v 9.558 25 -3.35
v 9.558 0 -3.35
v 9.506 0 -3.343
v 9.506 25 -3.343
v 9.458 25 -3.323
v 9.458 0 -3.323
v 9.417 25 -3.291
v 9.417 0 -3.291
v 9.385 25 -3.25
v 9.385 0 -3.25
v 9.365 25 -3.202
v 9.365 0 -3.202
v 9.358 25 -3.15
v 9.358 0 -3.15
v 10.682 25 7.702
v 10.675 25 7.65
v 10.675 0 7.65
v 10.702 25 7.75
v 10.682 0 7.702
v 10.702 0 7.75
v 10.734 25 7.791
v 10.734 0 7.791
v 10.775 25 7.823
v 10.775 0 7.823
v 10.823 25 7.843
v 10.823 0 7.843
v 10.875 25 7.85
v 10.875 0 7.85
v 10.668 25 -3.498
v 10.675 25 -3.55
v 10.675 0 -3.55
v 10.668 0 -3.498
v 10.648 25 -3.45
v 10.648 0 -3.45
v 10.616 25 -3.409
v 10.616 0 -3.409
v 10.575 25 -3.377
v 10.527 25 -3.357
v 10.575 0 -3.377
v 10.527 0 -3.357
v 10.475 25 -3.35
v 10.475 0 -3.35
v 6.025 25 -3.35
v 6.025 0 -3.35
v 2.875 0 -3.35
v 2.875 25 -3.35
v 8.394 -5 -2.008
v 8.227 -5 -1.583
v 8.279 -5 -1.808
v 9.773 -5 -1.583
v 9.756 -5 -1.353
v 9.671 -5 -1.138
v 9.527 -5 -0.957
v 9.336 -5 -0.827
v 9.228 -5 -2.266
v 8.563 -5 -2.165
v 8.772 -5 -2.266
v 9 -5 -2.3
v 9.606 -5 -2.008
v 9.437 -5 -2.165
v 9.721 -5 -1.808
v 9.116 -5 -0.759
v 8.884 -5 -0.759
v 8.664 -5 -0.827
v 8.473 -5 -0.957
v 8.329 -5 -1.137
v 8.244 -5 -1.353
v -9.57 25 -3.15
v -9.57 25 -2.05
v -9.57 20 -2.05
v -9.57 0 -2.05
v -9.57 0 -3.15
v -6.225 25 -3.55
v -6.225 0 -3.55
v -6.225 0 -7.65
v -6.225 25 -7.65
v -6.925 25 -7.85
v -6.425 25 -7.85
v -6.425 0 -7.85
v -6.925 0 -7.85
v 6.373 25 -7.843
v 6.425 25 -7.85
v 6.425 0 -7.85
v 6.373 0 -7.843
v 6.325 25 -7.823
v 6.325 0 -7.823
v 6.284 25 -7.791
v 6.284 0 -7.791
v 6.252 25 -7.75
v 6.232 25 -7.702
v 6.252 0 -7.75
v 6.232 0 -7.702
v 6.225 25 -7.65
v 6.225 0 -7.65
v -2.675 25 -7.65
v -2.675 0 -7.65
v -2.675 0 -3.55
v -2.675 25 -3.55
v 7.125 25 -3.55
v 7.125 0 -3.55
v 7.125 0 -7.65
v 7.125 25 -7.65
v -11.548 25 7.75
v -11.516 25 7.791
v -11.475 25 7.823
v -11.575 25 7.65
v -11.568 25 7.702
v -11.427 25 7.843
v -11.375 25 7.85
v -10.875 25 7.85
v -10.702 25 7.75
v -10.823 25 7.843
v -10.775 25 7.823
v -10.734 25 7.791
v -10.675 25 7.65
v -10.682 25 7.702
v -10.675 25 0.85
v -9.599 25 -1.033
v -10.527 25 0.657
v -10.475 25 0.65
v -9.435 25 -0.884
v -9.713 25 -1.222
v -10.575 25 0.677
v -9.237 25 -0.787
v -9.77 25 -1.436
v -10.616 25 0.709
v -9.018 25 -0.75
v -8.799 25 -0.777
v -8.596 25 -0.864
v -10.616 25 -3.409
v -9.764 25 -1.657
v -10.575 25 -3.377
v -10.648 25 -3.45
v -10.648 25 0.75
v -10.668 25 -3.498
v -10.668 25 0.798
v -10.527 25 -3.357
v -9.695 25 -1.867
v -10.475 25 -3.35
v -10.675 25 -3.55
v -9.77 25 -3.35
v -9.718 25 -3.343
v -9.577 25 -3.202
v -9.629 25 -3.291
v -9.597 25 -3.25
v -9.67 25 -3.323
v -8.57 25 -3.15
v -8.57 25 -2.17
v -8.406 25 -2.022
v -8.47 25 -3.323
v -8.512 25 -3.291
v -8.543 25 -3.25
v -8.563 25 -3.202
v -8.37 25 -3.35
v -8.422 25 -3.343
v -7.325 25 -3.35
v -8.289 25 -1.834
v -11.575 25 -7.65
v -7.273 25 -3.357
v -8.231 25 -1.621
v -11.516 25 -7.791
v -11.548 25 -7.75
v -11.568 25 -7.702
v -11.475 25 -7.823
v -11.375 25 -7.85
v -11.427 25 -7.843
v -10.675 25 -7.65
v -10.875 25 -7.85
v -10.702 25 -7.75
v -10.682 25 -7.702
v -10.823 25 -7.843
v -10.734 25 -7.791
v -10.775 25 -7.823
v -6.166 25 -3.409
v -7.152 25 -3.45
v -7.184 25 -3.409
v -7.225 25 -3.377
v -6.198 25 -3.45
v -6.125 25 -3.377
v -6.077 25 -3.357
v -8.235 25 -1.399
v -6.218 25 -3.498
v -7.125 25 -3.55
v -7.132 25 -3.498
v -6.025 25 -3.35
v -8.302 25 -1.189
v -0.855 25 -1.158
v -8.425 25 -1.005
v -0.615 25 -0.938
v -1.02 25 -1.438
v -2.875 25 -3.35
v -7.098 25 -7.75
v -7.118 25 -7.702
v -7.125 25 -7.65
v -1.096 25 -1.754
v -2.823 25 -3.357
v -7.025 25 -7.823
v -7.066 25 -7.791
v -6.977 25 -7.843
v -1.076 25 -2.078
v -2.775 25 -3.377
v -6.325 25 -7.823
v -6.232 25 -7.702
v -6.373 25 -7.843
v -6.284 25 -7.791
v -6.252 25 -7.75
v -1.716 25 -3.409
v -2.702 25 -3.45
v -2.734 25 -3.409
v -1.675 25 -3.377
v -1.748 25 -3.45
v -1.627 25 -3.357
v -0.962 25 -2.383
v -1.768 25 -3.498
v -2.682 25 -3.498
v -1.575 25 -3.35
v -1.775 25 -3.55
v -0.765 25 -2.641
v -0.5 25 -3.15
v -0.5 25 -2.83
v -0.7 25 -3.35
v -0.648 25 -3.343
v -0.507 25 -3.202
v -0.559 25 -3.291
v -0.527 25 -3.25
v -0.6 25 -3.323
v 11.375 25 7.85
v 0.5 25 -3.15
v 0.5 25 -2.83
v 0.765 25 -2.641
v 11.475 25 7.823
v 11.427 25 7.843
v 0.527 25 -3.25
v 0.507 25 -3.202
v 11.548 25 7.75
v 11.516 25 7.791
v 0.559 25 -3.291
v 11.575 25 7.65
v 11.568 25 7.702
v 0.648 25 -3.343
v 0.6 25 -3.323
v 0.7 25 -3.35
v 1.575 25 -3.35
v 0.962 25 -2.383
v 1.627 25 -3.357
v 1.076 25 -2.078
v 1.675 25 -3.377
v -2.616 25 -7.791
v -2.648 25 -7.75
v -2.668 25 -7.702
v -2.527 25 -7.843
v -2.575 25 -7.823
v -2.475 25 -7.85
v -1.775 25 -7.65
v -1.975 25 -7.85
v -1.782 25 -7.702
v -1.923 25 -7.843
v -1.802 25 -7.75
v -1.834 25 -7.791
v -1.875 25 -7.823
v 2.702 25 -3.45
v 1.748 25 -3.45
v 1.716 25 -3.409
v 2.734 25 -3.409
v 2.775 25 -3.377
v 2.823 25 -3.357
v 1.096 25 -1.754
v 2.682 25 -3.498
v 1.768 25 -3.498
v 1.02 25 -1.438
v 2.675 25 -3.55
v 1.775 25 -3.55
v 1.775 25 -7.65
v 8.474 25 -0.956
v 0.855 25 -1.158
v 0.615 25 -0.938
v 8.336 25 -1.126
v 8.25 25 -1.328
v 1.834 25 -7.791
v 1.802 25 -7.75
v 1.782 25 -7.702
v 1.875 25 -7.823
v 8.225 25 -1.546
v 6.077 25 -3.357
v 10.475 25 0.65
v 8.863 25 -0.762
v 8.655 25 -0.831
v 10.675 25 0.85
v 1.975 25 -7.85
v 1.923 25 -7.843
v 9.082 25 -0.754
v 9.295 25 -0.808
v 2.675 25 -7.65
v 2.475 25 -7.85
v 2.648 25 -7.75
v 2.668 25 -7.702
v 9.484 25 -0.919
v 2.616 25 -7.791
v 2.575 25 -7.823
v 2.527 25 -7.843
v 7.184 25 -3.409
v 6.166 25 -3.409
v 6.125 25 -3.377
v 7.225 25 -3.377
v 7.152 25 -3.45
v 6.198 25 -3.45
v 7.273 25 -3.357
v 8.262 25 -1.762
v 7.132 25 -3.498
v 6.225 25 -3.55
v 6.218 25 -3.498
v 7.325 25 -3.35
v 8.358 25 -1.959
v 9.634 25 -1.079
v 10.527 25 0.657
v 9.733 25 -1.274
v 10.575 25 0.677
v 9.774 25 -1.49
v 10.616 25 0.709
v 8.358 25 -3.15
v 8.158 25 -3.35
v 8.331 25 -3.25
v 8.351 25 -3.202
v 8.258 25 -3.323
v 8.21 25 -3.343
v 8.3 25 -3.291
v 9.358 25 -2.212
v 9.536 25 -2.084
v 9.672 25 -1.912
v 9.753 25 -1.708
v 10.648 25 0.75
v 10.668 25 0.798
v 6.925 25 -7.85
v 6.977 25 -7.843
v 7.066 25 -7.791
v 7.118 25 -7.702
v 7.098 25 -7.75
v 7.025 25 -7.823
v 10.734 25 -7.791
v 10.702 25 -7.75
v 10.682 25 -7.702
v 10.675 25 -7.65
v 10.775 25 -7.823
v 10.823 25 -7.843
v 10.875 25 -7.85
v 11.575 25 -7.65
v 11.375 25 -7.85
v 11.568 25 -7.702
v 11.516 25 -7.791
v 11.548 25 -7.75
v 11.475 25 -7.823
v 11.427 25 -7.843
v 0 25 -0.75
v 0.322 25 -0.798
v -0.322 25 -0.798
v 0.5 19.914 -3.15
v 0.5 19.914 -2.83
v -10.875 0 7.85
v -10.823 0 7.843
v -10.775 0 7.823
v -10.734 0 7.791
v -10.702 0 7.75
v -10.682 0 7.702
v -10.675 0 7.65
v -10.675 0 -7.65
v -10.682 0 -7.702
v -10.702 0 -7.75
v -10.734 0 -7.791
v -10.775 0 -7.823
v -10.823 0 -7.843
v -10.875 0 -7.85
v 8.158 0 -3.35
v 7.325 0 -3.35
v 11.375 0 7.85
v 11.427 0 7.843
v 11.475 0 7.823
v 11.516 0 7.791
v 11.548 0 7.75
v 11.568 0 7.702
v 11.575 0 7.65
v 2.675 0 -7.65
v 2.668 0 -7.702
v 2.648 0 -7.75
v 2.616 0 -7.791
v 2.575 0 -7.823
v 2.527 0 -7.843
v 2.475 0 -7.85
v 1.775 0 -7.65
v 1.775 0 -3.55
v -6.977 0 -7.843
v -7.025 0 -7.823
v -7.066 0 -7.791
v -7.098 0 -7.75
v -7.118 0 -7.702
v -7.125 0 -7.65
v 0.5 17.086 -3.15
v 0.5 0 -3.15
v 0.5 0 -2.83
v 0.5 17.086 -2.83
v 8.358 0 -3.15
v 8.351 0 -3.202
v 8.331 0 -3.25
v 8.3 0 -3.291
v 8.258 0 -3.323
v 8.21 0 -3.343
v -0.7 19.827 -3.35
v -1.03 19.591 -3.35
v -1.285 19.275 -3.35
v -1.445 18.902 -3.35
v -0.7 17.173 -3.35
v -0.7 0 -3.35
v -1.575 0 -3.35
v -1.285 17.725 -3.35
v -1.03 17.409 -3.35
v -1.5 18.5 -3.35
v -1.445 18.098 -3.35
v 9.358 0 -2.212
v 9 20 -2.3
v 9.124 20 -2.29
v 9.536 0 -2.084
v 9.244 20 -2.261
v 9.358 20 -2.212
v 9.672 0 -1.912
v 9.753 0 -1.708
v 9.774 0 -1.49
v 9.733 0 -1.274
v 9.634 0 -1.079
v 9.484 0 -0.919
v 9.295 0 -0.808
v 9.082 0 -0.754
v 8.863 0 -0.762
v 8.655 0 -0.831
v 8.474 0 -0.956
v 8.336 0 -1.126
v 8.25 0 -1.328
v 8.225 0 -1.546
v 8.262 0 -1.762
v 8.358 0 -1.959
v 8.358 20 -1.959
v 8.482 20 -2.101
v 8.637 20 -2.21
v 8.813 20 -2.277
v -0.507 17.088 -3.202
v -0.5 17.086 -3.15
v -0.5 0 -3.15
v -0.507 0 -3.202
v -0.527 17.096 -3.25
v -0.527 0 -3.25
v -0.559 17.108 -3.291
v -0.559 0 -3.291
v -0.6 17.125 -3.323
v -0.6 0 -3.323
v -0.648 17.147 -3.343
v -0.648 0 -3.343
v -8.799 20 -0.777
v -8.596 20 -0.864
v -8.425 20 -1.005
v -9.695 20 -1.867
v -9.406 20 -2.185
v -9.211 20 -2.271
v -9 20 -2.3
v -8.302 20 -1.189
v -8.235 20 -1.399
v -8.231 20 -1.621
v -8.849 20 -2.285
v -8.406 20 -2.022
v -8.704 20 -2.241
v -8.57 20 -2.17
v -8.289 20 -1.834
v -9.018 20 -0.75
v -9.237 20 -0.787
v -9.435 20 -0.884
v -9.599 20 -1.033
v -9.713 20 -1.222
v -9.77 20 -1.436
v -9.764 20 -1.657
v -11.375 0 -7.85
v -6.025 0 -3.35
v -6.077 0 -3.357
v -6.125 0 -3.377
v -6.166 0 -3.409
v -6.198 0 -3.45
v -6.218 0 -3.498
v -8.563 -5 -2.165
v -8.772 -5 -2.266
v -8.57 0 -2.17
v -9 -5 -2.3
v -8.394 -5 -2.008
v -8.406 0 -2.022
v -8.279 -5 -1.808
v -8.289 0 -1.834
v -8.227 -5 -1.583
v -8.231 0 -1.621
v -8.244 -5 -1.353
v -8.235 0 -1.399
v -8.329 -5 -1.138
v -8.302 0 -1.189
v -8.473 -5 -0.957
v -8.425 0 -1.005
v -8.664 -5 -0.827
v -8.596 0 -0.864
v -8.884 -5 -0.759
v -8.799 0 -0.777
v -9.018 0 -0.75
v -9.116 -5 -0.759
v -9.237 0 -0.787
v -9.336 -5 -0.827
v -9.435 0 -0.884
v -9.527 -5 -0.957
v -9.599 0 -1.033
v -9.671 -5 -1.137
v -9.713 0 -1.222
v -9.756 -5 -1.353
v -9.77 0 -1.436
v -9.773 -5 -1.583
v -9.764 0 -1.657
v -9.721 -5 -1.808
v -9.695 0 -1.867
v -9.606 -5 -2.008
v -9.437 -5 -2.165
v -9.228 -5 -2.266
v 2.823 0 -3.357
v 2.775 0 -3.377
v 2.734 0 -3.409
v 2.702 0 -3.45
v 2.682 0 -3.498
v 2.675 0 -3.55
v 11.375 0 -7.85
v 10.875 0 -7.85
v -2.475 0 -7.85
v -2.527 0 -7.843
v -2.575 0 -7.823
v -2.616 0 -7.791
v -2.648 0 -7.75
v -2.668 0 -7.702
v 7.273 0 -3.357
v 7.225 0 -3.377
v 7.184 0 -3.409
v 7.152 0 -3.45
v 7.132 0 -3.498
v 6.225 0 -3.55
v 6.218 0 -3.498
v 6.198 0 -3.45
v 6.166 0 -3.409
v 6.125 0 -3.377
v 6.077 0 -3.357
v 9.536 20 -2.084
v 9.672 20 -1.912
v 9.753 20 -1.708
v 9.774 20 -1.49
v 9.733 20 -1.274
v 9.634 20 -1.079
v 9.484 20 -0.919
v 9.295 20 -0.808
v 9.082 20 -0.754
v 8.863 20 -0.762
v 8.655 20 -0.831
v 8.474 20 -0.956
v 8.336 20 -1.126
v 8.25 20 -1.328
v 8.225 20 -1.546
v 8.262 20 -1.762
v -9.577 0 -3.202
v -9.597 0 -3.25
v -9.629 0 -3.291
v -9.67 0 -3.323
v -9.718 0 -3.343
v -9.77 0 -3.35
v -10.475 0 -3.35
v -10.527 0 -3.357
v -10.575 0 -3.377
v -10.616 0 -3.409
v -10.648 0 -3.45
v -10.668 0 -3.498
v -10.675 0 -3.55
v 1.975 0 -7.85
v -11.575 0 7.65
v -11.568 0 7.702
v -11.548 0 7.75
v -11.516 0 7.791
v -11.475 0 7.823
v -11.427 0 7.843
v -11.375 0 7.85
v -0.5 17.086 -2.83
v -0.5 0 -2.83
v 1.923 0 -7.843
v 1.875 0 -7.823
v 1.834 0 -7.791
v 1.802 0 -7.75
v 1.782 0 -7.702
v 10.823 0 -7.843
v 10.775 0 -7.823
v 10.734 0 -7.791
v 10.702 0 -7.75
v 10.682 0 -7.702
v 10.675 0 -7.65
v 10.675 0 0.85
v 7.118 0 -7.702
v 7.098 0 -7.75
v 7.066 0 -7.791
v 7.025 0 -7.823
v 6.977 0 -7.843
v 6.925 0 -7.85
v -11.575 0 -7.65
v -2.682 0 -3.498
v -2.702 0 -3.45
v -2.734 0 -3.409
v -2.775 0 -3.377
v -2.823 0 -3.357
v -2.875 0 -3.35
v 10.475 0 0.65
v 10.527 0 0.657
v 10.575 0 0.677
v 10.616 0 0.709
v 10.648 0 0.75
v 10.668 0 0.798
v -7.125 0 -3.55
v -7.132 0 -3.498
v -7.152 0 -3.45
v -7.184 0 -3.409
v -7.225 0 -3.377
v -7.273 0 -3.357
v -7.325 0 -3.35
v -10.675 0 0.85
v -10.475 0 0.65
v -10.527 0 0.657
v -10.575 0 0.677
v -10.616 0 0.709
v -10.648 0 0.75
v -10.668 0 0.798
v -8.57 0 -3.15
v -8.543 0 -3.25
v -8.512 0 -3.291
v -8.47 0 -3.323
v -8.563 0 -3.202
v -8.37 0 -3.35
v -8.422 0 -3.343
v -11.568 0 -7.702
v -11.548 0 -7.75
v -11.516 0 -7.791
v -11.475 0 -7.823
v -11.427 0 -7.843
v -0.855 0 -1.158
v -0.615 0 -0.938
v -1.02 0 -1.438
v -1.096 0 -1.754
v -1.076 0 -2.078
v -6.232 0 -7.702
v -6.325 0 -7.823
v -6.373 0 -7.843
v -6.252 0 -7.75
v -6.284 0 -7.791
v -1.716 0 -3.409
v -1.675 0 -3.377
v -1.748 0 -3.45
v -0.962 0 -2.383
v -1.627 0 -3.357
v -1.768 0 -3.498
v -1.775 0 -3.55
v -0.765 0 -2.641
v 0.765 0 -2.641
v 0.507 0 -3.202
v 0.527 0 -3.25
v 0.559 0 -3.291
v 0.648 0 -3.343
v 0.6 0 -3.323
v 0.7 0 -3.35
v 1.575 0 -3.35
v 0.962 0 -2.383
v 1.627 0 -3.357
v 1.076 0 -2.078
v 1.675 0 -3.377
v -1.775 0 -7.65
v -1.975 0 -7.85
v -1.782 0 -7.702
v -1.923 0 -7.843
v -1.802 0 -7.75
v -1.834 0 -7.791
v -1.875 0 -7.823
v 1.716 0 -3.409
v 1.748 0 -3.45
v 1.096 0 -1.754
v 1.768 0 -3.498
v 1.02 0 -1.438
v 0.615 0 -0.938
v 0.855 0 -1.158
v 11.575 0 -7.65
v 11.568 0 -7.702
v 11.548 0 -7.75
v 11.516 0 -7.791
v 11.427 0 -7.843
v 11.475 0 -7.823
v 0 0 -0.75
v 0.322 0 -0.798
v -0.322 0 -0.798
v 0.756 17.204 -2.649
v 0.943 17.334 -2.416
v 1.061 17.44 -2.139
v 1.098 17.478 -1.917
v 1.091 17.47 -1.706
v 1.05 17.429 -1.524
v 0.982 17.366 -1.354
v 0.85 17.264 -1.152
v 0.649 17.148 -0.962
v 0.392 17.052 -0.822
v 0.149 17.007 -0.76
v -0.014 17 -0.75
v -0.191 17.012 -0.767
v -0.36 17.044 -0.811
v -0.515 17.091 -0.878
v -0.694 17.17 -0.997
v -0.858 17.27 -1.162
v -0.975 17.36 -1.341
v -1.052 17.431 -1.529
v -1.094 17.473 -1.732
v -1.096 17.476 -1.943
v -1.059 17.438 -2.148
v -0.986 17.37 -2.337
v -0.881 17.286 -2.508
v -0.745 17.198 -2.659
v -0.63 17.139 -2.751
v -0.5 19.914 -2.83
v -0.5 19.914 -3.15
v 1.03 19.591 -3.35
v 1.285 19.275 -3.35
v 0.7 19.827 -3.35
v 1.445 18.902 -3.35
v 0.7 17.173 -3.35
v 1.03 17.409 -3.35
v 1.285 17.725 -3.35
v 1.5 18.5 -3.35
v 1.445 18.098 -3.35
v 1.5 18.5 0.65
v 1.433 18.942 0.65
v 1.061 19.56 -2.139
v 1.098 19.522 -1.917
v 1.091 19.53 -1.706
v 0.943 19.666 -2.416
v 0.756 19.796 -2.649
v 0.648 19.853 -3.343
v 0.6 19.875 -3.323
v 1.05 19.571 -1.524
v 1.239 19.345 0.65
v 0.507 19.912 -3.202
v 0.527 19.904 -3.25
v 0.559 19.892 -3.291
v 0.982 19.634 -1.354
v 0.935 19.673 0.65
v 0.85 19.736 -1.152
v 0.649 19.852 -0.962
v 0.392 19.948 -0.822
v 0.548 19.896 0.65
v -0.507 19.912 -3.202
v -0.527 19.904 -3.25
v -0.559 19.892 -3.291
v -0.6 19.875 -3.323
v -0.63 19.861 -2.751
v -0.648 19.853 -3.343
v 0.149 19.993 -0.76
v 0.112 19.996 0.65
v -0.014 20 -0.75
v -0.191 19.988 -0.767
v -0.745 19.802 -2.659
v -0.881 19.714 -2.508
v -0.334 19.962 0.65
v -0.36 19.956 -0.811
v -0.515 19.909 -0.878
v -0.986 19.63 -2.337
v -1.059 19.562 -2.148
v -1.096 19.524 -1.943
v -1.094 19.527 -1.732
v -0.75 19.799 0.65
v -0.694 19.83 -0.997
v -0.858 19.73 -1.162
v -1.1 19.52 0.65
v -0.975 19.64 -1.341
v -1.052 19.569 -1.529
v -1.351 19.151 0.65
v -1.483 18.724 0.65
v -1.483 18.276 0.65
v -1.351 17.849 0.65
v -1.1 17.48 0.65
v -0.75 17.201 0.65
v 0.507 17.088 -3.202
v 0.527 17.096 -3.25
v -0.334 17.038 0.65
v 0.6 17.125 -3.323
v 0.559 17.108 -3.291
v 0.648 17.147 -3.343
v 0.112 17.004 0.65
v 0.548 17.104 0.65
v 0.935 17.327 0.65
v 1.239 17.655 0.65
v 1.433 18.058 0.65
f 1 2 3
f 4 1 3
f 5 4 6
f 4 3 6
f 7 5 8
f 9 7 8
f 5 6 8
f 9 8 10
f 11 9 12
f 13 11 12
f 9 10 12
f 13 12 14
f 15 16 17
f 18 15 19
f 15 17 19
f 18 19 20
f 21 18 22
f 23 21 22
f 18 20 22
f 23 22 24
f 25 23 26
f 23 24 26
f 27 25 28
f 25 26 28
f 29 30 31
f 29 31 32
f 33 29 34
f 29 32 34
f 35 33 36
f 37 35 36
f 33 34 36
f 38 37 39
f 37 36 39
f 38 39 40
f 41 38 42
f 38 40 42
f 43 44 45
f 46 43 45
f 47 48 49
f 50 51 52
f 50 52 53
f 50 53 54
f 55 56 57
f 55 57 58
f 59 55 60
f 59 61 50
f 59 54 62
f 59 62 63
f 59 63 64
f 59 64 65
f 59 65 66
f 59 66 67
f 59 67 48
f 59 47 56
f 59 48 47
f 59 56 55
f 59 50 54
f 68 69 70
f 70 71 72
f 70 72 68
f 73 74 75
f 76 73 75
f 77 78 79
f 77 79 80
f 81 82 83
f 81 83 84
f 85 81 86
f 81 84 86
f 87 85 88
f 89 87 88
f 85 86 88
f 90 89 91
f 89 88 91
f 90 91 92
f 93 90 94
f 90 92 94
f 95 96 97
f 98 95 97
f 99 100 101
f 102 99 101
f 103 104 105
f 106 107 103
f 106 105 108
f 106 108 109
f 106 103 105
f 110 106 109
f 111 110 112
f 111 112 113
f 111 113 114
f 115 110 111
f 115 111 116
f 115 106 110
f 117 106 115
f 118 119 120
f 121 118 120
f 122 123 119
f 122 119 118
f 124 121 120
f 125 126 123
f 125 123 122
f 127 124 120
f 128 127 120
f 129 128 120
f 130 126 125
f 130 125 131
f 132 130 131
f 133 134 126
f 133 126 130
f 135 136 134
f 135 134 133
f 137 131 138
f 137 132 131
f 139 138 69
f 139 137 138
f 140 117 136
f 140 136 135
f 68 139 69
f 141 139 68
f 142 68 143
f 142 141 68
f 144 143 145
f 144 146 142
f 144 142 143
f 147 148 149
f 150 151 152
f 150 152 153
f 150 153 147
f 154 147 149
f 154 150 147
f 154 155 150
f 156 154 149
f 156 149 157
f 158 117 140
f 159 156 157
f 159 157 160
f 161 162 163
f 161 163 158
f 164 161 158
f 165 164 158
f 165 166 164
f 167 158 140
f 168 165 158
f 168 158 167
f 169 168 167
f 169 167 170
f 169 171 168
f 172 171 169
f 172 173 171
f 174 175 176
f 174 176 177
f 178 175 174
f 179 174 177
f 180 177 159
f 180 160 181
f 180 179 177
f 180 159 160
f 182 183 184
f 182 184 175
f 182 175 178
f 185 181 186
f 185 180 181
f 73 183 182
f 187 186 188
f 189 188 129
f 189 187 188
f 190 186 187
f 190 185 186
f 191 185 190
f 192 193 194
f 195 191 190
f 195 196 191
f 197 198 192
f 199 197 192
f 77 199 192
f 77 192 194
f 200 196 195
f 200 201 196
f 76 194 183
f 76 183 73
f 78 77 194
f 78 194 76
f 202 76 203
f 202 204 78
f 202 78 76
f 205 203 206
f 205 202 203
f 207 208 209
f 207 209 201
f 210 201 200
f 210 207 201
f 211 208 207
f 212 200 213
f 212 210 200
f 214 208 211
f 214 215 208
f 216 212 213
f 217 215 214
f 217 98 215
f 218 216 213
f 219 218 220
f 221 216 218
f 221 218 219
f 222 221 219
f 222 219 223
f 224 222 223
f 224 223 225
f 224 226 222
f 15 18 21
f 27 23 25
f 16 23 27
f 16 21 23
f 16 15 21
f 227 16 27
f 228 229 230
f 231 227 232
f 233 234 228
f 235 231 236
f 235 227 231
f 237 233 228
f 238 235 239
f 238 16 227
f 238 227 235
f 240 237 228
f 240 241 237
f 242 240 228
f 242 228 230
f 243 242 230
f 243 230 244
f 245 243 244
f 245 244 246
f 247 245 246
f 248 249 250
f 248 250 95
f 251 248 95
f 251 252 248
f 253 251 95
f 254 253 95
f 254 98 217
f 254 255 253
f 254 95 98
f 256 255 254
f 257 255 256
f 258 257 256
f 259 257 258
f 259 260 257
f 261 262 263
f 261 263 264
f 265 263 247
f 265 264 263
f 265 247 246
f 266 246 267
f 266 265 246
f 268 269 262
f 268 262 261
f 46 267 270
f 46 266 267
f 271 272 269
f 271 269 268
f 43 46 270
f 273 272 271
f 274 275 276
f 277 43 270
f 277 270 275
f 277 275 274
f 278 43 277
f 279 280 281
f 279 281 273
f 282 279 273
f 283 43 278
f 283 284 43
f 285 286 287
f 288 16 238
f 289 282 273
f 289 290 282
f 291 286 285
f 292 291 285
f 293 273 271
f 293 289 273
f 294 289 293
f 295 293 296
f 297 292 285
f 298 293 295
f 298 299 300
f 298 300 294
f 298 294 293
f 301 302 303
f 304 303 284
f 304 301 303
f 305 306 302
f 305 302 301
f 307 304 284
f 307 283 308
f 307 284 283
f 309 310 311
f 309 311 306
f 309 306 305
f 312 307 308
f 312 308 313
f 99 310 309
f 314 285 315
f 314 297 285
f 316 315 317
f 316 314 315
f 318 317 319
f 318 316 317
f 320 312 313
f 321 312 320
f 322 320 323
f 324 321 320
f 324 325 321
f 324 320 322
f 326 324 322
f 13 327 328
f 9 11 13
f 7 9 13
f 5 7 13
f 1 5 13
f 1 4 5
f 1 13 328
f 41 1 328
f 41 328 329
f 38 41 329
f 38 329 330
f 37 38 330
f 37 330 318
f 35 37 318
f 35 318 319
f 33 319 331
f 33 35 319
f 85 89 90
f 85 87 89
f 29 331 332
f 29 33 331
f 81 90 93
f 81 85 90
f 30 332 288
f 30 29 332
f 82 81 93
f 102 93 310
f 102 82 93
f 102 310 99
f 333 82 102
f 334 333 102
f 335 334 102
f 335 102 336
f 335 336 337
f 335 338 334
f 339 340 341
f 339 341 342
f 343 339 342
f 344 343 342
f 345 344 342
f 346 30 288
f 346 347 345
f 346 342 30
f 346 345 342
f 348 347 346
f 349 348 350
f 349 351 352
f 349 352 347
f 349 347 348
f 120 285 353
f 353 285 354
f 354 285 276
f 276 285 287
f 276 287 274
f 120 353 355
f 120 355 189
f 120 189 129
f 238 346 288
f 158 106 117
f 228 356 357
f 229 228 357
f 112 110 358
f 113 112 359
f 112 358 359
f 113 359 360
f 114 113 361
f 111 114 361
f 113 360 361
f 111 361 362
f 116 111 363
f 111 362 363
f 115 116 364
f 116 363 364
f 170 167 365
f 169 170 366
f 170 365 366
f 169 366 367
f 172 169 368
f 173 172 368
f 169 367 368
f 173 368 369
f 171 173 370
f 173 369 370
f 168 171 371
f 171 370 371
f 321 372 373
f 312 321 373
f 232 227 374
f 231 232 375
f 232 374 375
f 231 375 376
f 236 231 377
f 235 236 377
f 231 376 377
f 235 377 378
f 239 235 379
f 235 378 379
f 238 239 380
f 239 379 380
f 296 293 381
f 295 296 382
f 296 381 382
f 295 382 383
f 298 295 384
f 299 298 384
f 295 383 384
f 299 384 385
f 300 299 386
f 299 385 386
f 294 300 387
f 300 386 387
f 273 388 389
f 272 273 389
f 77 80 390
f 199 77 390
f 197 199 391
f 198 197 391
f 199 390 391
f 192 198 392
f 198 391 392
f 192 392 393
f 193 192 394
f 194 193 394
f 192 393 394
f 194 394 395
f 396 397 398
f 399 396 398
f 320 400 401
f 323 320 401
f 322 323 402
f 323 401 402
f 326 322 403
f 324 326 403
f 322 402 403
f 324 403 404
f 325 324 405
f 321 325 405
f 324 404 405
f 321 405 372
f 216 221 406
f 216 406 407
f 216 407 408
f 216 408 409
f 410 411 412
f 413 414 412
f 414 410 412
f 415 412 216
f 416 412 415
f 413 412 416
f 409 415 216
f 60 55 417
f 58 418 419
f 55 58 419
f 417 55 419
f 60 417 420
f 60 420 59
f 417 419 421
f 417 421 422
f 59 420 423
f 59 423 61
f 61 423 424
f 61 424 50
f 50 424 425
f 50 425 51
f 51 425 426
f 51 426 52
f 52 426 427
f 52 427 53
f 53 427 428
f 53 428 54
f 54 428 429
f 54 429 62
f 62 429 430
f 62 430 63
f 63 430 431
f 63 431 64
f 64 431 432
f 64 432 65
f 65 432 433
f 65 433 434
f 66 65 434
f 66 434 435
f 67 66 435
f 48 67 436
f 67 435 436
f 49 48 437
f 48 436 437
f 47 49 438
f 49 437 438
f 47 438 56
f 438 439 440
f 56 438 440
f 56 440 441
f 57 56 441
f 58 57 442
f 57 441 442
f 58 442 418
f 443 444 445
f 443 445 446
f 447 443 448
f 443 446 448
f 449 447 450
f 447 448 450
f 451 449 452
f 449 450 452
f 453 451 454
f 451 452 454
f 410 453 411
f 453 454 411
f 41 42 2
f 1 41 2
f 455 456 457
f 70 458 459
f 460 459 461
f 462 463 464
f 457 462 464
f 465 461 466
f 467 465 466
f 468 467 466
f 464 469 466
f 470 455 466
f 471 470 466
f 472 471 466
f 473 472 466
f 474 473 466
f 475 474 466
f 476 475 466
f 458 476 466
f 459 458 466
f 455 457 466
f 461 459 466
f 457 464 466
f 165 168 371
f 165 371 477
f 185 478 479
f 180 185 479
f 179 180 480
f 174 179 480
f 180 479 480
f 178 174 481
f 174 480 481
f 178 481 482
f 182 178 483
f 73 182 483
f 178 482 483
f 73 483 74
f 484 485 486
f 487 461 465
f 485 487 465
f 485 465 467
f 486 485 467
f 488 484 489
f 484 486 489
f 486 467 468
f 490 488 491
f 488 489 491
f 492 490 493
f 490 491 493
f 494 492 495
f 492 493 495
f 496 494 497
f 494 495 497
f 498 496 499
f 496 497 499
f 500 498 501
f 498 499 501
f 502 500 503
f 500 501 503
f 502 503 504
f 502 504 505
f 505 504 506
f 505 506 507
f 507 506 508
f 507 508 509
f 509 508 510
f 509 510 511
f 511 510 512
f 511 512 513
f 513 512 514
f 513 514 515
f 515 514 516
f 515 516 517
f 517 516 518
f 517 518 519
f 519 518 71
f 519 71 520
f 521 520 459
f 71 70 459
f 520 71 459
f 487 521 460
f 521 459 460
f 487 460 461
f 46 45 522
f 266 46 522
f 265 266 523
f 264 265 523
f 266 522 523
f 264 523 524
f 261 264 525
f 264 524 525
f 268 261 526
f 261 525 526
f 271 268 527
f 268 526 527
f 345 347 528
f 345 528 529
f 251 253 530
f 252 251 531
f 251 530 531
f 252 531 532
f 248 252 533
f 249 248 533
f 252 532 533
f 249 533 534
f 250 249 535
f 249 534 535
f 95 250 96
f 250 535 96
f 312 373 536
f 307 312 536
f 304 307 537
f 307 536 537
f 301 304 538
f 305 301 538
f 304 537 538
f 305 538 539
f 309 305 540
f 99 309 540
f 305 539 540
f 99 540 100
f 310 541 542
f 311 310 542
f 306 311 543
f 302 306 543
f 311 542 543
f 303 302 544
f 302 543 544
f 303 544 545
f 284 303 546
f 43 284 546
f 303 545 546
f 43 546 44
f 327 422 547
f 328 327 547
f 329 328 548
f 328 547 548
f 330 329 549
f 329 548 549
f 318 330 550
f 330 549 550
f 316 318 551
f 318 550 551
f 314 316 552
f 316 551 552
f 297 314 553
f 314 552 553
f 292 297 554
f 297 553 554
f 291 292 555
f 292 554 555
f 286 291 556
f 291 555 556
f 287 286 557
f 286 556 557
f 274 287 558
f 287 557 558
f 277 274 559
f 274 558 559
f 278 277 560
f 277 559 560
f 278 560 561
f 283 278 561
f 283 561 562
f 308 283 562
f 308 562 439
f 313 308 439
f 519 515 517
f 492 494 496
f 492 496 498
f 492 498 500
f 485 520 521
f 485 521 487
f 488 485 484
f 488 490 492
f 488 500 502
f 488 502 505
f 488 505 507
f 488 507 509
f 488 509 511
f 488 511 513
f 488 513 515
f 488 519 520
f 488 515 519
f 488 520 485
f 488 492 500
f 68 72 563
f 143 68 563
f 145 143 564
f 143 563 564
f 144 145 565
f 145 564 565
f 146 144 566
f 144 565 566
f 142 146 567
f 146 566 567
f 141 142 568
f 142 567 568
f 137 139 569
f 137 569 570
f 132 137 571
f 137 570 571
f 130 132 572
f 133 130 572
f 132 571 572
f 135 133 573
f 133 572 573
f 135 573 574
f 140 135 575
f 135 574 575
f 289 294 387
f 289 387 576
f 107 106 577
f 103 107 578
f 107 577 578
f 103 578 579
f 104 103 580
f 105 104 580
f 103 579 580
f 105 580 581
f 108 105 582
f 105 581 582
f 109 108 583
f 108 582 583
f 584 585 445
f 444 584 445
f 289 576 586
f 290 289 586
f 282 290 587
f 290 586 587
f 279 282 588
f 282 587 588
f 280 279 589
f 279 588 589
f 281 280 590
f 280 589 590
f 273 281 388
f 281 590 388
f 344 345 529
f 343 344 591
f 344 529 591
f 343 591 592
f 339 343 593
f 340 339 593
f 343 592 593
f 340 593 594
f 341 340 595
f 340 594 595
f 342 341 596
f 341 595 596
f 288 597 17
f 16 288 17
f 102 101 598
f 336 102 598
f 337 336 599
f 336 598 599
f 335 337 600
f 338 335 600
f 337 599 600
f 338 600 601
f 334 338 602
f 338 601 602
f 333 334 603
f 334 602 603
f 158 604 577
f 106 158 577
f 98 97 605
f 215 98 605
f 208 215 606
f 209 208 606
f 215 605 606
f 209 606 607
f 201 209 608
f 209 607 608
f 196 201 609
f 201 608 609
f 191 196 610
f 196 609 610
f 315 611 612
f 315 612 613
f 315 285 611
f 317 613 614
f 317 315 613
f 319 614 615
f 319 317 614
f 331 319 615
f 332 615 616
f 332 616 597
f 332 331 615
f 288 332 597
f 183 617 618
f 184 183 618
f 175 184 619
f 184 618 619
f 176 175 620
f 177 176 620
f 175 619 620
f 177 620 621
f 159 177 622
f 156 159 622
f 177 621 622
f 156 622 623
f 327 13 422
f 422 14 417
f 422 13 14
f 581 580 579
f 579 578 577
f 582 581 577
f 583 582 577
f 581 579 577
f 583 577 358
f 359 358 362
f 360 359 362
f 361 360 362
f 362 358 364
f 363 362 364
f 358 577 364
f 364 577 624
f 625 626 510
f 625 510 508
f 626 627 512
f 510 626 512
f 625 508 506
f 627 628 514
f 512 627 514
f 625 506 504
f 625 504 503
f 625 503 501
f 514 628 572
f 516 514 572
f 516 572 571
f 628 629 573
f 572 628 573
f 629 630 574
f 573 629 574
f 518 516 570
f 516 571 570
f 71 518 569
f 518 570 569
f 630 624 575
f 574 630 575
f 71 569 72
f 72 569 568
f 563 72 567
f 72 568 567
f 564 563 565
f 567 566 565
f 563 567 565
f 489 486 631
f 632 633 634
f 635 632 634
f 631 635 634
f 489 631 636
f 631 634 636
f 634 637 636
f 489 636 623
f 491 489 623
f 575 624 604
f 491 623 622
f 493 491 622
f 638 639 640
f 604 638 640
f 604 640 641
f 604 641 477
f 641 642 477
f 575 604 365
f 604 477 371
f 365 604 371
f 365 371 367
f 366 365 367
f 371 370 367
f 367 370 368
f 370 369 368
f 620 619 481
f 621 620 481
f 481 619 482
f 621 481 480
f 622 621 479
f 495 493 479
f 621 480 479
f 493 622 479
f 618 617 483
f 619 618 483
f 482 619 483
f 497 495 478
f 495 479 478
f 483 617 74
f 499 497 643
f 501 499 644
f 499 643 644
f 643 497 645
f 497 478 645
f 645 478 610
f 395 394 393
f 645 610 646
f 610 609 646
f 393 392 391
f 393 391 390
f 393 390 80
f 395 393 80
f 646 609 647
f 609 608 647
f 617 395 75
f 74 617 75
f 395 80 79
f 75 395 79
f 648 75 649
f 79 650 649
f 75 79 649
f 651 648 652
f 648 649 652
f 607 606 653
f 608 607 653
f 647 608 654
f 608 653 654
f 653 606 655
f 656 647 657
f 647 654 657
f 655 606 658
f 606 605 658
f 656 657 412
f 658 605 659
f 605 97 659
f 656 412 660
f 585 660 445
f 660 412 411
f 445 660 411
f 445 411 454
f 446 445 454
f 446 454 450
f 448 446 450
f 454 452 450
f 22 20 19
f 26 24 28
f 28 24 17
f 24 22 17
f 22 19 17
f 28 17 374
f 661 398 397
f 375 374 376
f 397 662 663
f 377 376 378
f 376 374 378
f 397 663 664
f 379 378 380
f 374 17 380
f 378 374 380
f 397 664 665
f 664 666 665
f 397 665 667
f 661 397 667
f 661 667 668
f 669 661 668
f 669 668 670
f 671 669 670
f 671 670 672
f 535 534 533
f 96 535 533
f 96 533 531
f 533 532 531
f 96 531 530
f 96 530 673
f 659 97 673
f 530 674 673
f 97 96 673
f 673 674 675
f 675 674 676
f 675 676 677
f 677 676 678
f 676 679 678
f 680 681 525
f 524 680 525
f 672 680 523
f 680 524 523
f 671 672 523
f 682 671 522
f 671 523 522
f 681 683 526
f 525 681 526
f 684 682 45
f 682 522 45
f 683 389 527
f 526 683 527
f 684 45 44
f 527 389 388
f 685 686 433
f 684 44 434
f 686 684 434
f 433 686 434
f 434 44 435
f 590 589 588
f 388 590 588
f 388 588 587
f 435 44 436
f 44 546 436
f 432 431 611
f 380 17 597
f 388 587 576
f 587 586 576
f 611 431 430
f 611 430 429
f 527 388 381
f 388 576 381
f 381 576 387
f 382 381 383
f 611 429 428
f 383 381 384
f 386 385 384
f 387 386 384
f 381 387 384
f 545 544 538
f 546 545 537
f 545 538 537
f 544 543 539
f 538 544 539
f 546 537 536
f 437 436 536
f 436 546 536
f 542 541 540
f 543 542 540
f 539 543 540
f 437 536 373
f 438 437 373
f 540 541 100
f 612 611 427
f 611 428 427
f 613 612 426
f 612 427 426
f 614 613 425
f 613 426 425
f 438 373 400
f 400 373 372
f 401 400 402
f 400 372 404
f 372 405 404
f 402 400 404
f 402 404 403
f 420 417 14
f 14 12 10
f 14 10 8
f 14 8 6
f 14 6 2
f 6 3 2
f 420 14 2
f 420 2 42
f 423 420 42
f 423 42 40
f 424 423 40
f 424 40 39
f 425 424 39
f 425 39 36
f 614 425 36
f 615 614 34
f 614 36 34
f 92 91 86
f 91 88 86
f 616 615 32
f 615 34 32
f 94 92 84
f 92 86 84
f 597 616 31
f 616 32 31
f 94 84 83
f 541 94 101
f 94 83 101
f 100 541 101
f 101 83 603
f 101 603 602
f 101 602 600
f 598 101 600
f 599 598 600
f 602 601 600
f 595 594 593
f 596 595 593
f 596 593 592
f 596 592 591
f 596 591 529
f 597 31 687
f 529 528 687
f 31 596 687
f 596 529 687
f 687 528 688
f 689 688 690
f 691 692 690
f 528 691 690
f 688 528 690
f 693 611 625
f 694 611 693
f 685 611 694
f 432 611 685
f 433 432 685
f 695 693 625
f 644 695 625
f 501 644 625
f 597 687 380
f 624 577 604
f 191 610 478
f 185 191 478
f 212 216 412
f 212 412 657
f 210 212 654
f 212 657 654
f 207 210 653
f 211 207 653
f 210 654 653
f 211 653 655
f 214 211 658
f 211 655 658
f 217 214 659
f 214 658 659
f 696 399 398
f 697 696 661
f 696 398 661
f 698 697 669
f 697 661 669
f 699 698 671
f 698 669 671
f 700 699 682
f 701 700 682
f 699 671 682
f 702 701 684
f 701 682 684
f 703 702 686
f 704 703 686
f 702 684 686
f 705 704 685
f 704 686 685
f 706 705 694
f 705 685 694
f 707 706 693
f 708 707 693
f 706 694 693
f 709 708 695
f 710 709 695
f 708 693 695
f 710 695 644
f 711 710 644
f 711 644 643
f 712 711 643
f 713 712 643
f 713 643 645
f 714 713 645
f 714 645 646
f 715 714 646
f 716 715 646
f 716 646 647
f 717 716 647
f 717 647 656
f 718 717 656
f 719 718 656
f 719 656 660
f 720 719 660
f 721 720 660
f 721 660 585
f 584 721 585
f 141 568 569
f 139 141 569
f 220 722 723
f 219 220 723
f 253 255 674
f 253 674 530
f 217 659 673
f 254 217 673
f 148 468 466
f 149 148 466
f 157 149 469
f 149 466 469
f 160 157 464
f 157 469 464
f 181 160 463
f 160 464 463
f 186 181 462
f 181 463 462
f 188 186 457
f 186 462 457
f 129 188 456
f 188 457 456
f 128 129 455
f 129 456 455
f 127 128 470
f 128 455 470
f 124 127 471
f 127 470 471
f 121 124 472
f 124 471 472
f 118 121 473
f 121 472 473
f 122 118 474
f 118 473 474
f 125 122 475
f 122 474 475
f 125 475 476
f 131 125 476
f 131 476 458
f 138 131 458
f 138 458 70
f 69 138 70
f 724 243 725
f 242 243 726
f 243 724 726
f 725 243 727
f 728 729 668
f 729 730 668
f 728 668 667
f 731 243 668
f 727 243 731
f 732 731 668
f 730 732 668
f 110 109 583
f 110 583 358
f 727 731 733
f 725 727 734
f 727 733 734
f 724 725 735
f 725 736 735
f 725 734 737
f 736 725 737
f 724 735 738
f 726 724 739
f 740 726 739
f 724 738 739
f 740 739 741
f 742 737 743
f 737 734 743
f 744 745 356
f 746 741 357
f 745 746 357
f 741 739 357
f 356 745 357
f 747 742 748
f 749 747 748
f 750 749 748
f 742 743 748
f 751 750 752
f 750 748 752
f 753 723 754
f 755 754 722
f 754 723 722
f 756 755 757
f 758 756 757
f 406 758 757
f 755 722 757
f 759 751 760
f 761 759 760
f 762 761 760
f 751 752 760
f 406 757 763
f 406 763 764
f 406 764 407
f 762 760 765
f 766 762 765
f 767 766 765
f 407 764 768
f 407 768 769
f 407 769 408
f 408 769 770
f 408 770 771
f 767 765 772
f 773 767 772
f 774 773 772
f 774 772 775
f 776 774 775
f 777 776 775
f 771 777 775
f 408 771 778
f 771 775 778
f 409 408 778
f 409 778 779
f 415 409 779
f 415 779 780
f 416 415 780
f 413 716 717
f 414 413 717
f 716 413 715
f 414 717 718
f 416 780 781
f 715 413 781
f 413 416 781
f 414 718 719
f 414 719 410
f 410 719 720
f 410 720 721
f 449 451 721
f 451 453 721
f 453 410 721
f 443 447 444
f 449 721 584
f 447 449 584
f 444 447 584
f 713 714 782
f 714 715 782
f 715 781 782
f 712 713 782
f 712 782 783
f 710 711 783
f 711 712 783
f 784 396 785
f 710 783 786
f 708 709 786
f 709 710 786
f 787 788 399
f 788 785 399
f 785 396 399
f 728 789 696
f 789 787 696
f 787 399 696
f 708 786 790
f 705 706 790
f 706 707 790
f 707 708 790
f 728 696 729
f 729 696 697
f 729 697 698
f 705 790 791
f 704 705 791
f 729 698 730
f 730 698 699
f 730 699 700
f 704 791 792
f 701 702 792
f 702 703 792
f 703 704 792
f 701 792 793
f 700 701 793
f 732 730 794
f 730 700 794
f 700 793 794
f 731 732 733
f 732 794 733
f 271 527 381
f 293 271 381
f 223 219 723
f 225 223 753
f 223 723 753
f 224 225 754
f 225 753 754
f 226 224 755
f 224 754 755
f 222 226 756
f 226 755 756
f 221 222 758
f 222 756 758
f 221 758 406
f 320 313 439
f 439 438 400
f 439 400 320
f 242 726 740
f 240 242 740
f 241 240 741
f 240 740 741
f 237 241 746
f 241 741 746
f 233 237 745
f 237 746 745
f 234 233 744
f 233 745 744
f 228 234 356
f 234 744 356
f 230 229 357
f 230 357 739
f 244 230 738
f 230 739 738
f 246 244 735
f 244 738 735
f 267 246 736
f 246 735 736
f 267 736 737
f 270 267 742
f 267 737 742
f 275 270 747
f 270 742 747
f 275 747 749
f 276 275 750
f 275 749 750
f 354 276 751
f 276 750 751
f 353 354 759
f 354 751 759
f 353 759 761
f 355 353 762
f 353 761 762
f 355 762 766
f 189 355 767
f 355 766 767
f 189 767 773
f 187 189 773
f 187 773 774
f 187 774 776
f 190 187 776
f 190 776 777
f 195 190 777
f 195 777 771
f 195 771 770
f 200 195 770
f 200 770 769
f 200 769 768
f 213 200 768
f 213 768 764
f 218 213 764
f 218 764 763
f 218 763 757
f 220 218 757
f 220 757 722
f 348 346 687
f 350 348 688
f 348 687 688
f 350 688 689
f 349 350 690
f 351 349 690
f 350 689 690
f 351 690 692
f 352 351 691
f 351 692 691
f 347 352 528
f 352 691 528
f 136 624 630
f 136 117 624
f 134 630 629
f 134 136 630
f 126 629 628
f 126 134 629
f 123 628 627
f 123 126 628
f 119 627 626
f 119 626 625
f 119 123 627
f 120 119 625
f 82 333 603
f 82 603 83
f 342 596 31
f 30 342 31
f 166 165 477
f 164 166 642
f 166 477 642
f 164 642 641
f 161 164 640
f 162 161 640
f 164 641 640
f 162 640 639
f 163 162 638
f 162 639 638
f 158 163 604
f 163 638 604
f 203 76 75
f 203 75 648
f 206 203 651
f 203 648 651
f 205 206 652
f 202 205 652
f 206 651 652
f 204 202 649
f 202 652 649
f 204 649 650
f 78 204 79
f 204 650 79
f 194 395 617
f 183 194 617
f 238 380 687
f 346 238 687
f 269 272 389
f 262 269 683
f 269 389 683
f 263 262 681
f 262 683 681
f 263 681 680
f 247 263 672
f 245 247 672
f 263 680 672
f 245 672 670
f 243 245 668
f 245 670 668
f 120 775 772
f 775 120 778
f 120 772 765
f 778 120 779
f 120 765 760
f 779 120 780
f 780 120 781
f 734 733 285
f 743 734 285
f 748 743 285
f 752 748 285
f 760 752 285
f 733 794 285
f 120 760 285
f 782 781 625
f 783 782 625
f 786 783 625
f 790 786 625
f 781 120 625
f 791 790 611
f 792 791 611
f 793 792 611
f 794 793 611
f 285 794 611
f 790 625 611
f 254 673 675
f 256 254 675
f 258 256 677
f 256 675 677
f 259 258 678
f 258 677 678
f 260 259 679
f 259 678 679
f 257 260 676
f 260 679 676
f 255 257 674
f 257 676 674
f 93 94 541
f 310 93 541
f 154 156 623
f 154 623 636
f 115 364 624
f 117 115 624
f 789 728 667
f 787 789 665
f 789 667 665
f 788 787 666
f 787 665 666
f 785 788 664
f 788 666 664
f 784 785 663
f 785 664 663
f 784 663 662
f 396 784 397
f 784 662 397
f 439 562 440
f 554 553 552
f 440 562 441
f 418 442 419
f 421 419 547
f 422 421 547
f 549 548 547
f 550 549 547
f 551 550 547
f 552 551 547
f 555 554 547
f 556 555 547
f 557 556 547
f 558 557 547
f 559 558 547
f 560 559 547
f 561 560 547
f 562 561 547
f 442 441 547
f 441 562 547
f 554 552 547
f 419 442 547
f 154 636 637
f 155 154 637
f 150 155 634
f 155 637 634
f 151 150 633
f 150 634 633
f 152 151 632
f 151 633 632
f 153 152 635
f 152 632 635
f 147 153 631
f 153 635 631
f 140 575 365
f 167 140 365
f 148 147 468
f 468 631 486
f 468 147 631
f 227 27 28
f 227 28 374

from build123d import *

# Parameters (mm, degrees)
EXTRUDE_1_DEPTH      = 25
EXTRUDE_2_DEPTH      = 5
EXTRUDE_2_DEPTH_BACK = 20
SKETCH_2_R           = 0.775
FILLET_1_R           = 0.2
SKETCH_3_R           = 1.5
CUT_EXTRUDE_1_DEPTH  = 10


with BuildPart() as part:
    # 草图1 → 凸台-拉伸1 (new body)
    with BuildSketch(Plane(origin=(0, 0, 0), x_dir=(1, 0, 0), z_dir=(0, 1, 0))):
        with BuildLine():
            Line((-11.375, -7.85), (-10.875, -7.85))
            ThreePointArc((-10.875, -7.85), (-10.733578644, -7.791421356), (-10.675, -7.65))
            Line((-10.675, -7.65), (-10.675, -0.65))
            Line((-10.675, -0.65), (10.675, -0.65))
            Line((10.675, -0.65), (10.675, -7.65))
            ThreePointArc((10.675, -7.65), (10.733578644, -7.791421356), (10.875, -7.85))
            Line((10.875, -7.85), (11.375, -7.85))
            ThreePointArc((11.375, -7.85), (11.516421356, -7.791421356), (11.575, -7.65))
            Line((11.575, -7.65), (11.575, 7.65))
            ThreePointArc((11.575, 7.65), (11.516421356, 7.791421356), (11.375, 7.85))
            Line((11.375, 7.85), (10.875, 7.85))
            ThreePointArc((10.875, 7.85), (10.733578644, 7.791421356), (10.675, 7.65))
            Line((10.675, 7.65), (10.675, 3.55))
            ThreePointArc((10.675, 3.55), (10.616421356, 3.408578644), (10.475, 3.35))
            Line((10.475, 3.35), (9.558099354, 3.35))
            ThreePointArc((9.558099354, 3.35), (9.416677998, 3.291421356), (9.358099354, 3.15))
            Line((9.358099354, 3.15), (9.358099354, 2.212306229))
            ThreePointArc((9.358099354, 2.212306229), (9.190112859, 0.773679762), (8.358099354, 1.959267845))
            Line((8.358099354, 1.959267845), (8.358099354, 3.15))
            ThreePointArc((8.358099354, 3.15), (8.29952071, 3.291421356), (8.158099354, 3.35))
            Line((8.158099354, 3.35), (7.325, 3.35))
            ThreePointArc((7.325, 3.35), (7.183578644, 3.408578644), (7.125, 3.55))
            Line((7.125, 3.55), (7.125, 7.65))
            ThreePointArc((7.125, 7.65), (7.066421356, 7.791421356), (6.925, 7.85))
            Line((6.925, 7.85), (6.425, 7.85))
            ThreePointArc((6.425, 7.85), (6.283578644, 7.791421356), (6.225, 7.65))
            Line((6.225, 7.65), (6.225, 3.55))
            ThreePointArc((6.225, 3.55), (6.166421356, 3.408578644), (6.025, 3.35))
            Line((6.025, 3.35), (2.875, 3.35))
            ThreePointArc((2.875, 3.35), (2.733578644, 3.408578644), (2.675, 3.55))
            Line((2.675, 3.55), (2.675, 7.65))
            ThreePointArc((2.675, 7.65), (2.616421356, 7.791421356), (2.475, 7.85))
            Line((2.475, 7.85), (1.975, 7.85))
            ThreePointArc((1.975, 7.85), (1.833578644, 7.791421356), (1.775, 7.65))
            Line((1.775, 7.65), (1.775, 3.55))
            ThreePointArc((1.775, 3.55), (1.716421356, 3.408578644), (1.575, 3.35))
            Line((1.575, 3.35), (0.7, 3.35))
            ThreePointArc((0.7, 3.35), (0.558578644, 3.291421356), (0.5, 3.15))
            Line((0.5, 3.15), (0.5, 2.829795897))
            ThreePointArc((0.5, 2.829795897), (0, 0.75), (-0.5, 2.829795897))
            Line((-0.5, 2.829795897), (-0.5, 3.15))
            ThreePointArc((-0.5, 3.15), (-0.558578644, 3.291421356), (-0.7, 3.35))
            Line((-0.7, 3.35), (-1.575, 3.35))
            ThreePointArc((-1.575, 3.35), (-1.716421356, 3.408578644), (-1.775, 3.55))
            Line((-1.775, 3.55), (-1.775, 7.65))
            ThreePointArc((-1.775, 7.65), (-1.833578644, 7.791421356), (-1.975, 7.85))
            Line((-1.975, 7.85), (-2.475, 7.85))
            ThreePointArc((-2.475, 7.85), (-2.616421356, 7.791421356), (-2.675, 7.65))
            Line((-2.675, 7.65), (-2.675, 3.55))
            ThreePointArc((-2.675, 3.55), (-2.733578644, 3.408578644), (-2.875, 3.35))
            Line((-2.875, 3.35), (-6.025, 3.35))
            ThreePointArc((-6.025, 3.35), (-6.166421356, 3.408578644), (-6.225, 3.55))
            Line((-6.225, 3.55), (-6.225, 7.65))
            ThreePointArc((-6.225, 7.65), (-6.283578644, 7.791421356), (-6.425, 7.85))
            Line((-6.425, 7.85), (-6.925, 7.85))
            ThreePointArc((-6.925, 7.85), (-7.066421356, 7.791421356), (-7.125, 7.65))
            Line((-7.125, 7.65), (-7.125, 3.55))
            ThreePointArc((-7.125, 3.55), (-7.183578644, 3.408578644), (-7.325, 3.35))
            Line((-7.325, 3.35), (-8.37016684, 3.35))
            ThreePointArc((-8.37016684, 3.35), (-8.511588196, 3.291421356), (-8.57016684, 3.15))
            Line((-8.57016684, 3.15), (-8.57016684, 2.169878635))
            ThreePointArc((-8.57016684, 2.169878635), (-8.907689329, 0.755517226), (-9.57016684, 2.049914064))
            Line((-9.57016684, 2.049914064), (-9.57016684, 3.15))
            ThreePointArc((-9.57016684, 3.15), (-9.628745484, 3.291421356), (-9.77016684, 3.35))
            Line((-9.77016684, 3.35), (-10.475, 3.35))
            ThreePointArc((-10.475, 3.35), (-10.616421356, 3.408578644), (-10.675, 3.55))
            Line((-10.675, 3.55), (-10.675, 7.65))
            ThreePointArc((-10.675, 7.65), (-10.733578644, 7.791421356), (-10.875, 7.85))
            Line((-10.875, 7.85), (-11.375, 7.85))
            ThreePointArc((-11.375, 7.85), (-11.516421356, 7.791421356), (-11.575, 7.65))
            Line((-11.575, 7.65), (-11.575, -7.65))
            ThreePointArc((-11.575, -7.65), (-11.516421356, -7.791421356), (-11.375, -7.85))
        make_face()
    extrude(amount=EXTRUDE_1_DEPTH)

    # 草图2 → 凸台-拉伸2 (add, two sides: drawn at the far end of the back side and taken through both)
    with BuildSketch(Plane.XZ.offset(-EXTRUDE_2_DEPTH_BACK)):
        with Locations(Location((-9, -1.525, 0), (0, 0, 270))):
            Circle(SKETCH_2_R)
        with Locations(Location((9, -1.525, 0), (0, 0, 270))):
            Circle(SKETCH_2_R)
    extrude(amount=EXTRUDE_2_DEPTH + EXTRUDE_2_DEPTH_BACK)

    # 圆角1
    fillet_1_edges = [part.edges().sort_by_distance(p)[0] for p in [
        (-10.675, 12.5, 0.65),
        (10.675, 12.5, 0.65),
    ]]
    fillet(fillet_1_edges, radius=FILLET_1_R)

    # 草图3 → 切除-拉伸1 (cut)
    with BuildSketch(Plane.XY.offset(0.65)):
        with Locations((0, 18.5)):
            Circle(SKETCH_3_R)
    extrude(amount=-CUT_EXTRUDE_1_DEPTH, mode=Mode.SUBTRACT)


solid = part.part
